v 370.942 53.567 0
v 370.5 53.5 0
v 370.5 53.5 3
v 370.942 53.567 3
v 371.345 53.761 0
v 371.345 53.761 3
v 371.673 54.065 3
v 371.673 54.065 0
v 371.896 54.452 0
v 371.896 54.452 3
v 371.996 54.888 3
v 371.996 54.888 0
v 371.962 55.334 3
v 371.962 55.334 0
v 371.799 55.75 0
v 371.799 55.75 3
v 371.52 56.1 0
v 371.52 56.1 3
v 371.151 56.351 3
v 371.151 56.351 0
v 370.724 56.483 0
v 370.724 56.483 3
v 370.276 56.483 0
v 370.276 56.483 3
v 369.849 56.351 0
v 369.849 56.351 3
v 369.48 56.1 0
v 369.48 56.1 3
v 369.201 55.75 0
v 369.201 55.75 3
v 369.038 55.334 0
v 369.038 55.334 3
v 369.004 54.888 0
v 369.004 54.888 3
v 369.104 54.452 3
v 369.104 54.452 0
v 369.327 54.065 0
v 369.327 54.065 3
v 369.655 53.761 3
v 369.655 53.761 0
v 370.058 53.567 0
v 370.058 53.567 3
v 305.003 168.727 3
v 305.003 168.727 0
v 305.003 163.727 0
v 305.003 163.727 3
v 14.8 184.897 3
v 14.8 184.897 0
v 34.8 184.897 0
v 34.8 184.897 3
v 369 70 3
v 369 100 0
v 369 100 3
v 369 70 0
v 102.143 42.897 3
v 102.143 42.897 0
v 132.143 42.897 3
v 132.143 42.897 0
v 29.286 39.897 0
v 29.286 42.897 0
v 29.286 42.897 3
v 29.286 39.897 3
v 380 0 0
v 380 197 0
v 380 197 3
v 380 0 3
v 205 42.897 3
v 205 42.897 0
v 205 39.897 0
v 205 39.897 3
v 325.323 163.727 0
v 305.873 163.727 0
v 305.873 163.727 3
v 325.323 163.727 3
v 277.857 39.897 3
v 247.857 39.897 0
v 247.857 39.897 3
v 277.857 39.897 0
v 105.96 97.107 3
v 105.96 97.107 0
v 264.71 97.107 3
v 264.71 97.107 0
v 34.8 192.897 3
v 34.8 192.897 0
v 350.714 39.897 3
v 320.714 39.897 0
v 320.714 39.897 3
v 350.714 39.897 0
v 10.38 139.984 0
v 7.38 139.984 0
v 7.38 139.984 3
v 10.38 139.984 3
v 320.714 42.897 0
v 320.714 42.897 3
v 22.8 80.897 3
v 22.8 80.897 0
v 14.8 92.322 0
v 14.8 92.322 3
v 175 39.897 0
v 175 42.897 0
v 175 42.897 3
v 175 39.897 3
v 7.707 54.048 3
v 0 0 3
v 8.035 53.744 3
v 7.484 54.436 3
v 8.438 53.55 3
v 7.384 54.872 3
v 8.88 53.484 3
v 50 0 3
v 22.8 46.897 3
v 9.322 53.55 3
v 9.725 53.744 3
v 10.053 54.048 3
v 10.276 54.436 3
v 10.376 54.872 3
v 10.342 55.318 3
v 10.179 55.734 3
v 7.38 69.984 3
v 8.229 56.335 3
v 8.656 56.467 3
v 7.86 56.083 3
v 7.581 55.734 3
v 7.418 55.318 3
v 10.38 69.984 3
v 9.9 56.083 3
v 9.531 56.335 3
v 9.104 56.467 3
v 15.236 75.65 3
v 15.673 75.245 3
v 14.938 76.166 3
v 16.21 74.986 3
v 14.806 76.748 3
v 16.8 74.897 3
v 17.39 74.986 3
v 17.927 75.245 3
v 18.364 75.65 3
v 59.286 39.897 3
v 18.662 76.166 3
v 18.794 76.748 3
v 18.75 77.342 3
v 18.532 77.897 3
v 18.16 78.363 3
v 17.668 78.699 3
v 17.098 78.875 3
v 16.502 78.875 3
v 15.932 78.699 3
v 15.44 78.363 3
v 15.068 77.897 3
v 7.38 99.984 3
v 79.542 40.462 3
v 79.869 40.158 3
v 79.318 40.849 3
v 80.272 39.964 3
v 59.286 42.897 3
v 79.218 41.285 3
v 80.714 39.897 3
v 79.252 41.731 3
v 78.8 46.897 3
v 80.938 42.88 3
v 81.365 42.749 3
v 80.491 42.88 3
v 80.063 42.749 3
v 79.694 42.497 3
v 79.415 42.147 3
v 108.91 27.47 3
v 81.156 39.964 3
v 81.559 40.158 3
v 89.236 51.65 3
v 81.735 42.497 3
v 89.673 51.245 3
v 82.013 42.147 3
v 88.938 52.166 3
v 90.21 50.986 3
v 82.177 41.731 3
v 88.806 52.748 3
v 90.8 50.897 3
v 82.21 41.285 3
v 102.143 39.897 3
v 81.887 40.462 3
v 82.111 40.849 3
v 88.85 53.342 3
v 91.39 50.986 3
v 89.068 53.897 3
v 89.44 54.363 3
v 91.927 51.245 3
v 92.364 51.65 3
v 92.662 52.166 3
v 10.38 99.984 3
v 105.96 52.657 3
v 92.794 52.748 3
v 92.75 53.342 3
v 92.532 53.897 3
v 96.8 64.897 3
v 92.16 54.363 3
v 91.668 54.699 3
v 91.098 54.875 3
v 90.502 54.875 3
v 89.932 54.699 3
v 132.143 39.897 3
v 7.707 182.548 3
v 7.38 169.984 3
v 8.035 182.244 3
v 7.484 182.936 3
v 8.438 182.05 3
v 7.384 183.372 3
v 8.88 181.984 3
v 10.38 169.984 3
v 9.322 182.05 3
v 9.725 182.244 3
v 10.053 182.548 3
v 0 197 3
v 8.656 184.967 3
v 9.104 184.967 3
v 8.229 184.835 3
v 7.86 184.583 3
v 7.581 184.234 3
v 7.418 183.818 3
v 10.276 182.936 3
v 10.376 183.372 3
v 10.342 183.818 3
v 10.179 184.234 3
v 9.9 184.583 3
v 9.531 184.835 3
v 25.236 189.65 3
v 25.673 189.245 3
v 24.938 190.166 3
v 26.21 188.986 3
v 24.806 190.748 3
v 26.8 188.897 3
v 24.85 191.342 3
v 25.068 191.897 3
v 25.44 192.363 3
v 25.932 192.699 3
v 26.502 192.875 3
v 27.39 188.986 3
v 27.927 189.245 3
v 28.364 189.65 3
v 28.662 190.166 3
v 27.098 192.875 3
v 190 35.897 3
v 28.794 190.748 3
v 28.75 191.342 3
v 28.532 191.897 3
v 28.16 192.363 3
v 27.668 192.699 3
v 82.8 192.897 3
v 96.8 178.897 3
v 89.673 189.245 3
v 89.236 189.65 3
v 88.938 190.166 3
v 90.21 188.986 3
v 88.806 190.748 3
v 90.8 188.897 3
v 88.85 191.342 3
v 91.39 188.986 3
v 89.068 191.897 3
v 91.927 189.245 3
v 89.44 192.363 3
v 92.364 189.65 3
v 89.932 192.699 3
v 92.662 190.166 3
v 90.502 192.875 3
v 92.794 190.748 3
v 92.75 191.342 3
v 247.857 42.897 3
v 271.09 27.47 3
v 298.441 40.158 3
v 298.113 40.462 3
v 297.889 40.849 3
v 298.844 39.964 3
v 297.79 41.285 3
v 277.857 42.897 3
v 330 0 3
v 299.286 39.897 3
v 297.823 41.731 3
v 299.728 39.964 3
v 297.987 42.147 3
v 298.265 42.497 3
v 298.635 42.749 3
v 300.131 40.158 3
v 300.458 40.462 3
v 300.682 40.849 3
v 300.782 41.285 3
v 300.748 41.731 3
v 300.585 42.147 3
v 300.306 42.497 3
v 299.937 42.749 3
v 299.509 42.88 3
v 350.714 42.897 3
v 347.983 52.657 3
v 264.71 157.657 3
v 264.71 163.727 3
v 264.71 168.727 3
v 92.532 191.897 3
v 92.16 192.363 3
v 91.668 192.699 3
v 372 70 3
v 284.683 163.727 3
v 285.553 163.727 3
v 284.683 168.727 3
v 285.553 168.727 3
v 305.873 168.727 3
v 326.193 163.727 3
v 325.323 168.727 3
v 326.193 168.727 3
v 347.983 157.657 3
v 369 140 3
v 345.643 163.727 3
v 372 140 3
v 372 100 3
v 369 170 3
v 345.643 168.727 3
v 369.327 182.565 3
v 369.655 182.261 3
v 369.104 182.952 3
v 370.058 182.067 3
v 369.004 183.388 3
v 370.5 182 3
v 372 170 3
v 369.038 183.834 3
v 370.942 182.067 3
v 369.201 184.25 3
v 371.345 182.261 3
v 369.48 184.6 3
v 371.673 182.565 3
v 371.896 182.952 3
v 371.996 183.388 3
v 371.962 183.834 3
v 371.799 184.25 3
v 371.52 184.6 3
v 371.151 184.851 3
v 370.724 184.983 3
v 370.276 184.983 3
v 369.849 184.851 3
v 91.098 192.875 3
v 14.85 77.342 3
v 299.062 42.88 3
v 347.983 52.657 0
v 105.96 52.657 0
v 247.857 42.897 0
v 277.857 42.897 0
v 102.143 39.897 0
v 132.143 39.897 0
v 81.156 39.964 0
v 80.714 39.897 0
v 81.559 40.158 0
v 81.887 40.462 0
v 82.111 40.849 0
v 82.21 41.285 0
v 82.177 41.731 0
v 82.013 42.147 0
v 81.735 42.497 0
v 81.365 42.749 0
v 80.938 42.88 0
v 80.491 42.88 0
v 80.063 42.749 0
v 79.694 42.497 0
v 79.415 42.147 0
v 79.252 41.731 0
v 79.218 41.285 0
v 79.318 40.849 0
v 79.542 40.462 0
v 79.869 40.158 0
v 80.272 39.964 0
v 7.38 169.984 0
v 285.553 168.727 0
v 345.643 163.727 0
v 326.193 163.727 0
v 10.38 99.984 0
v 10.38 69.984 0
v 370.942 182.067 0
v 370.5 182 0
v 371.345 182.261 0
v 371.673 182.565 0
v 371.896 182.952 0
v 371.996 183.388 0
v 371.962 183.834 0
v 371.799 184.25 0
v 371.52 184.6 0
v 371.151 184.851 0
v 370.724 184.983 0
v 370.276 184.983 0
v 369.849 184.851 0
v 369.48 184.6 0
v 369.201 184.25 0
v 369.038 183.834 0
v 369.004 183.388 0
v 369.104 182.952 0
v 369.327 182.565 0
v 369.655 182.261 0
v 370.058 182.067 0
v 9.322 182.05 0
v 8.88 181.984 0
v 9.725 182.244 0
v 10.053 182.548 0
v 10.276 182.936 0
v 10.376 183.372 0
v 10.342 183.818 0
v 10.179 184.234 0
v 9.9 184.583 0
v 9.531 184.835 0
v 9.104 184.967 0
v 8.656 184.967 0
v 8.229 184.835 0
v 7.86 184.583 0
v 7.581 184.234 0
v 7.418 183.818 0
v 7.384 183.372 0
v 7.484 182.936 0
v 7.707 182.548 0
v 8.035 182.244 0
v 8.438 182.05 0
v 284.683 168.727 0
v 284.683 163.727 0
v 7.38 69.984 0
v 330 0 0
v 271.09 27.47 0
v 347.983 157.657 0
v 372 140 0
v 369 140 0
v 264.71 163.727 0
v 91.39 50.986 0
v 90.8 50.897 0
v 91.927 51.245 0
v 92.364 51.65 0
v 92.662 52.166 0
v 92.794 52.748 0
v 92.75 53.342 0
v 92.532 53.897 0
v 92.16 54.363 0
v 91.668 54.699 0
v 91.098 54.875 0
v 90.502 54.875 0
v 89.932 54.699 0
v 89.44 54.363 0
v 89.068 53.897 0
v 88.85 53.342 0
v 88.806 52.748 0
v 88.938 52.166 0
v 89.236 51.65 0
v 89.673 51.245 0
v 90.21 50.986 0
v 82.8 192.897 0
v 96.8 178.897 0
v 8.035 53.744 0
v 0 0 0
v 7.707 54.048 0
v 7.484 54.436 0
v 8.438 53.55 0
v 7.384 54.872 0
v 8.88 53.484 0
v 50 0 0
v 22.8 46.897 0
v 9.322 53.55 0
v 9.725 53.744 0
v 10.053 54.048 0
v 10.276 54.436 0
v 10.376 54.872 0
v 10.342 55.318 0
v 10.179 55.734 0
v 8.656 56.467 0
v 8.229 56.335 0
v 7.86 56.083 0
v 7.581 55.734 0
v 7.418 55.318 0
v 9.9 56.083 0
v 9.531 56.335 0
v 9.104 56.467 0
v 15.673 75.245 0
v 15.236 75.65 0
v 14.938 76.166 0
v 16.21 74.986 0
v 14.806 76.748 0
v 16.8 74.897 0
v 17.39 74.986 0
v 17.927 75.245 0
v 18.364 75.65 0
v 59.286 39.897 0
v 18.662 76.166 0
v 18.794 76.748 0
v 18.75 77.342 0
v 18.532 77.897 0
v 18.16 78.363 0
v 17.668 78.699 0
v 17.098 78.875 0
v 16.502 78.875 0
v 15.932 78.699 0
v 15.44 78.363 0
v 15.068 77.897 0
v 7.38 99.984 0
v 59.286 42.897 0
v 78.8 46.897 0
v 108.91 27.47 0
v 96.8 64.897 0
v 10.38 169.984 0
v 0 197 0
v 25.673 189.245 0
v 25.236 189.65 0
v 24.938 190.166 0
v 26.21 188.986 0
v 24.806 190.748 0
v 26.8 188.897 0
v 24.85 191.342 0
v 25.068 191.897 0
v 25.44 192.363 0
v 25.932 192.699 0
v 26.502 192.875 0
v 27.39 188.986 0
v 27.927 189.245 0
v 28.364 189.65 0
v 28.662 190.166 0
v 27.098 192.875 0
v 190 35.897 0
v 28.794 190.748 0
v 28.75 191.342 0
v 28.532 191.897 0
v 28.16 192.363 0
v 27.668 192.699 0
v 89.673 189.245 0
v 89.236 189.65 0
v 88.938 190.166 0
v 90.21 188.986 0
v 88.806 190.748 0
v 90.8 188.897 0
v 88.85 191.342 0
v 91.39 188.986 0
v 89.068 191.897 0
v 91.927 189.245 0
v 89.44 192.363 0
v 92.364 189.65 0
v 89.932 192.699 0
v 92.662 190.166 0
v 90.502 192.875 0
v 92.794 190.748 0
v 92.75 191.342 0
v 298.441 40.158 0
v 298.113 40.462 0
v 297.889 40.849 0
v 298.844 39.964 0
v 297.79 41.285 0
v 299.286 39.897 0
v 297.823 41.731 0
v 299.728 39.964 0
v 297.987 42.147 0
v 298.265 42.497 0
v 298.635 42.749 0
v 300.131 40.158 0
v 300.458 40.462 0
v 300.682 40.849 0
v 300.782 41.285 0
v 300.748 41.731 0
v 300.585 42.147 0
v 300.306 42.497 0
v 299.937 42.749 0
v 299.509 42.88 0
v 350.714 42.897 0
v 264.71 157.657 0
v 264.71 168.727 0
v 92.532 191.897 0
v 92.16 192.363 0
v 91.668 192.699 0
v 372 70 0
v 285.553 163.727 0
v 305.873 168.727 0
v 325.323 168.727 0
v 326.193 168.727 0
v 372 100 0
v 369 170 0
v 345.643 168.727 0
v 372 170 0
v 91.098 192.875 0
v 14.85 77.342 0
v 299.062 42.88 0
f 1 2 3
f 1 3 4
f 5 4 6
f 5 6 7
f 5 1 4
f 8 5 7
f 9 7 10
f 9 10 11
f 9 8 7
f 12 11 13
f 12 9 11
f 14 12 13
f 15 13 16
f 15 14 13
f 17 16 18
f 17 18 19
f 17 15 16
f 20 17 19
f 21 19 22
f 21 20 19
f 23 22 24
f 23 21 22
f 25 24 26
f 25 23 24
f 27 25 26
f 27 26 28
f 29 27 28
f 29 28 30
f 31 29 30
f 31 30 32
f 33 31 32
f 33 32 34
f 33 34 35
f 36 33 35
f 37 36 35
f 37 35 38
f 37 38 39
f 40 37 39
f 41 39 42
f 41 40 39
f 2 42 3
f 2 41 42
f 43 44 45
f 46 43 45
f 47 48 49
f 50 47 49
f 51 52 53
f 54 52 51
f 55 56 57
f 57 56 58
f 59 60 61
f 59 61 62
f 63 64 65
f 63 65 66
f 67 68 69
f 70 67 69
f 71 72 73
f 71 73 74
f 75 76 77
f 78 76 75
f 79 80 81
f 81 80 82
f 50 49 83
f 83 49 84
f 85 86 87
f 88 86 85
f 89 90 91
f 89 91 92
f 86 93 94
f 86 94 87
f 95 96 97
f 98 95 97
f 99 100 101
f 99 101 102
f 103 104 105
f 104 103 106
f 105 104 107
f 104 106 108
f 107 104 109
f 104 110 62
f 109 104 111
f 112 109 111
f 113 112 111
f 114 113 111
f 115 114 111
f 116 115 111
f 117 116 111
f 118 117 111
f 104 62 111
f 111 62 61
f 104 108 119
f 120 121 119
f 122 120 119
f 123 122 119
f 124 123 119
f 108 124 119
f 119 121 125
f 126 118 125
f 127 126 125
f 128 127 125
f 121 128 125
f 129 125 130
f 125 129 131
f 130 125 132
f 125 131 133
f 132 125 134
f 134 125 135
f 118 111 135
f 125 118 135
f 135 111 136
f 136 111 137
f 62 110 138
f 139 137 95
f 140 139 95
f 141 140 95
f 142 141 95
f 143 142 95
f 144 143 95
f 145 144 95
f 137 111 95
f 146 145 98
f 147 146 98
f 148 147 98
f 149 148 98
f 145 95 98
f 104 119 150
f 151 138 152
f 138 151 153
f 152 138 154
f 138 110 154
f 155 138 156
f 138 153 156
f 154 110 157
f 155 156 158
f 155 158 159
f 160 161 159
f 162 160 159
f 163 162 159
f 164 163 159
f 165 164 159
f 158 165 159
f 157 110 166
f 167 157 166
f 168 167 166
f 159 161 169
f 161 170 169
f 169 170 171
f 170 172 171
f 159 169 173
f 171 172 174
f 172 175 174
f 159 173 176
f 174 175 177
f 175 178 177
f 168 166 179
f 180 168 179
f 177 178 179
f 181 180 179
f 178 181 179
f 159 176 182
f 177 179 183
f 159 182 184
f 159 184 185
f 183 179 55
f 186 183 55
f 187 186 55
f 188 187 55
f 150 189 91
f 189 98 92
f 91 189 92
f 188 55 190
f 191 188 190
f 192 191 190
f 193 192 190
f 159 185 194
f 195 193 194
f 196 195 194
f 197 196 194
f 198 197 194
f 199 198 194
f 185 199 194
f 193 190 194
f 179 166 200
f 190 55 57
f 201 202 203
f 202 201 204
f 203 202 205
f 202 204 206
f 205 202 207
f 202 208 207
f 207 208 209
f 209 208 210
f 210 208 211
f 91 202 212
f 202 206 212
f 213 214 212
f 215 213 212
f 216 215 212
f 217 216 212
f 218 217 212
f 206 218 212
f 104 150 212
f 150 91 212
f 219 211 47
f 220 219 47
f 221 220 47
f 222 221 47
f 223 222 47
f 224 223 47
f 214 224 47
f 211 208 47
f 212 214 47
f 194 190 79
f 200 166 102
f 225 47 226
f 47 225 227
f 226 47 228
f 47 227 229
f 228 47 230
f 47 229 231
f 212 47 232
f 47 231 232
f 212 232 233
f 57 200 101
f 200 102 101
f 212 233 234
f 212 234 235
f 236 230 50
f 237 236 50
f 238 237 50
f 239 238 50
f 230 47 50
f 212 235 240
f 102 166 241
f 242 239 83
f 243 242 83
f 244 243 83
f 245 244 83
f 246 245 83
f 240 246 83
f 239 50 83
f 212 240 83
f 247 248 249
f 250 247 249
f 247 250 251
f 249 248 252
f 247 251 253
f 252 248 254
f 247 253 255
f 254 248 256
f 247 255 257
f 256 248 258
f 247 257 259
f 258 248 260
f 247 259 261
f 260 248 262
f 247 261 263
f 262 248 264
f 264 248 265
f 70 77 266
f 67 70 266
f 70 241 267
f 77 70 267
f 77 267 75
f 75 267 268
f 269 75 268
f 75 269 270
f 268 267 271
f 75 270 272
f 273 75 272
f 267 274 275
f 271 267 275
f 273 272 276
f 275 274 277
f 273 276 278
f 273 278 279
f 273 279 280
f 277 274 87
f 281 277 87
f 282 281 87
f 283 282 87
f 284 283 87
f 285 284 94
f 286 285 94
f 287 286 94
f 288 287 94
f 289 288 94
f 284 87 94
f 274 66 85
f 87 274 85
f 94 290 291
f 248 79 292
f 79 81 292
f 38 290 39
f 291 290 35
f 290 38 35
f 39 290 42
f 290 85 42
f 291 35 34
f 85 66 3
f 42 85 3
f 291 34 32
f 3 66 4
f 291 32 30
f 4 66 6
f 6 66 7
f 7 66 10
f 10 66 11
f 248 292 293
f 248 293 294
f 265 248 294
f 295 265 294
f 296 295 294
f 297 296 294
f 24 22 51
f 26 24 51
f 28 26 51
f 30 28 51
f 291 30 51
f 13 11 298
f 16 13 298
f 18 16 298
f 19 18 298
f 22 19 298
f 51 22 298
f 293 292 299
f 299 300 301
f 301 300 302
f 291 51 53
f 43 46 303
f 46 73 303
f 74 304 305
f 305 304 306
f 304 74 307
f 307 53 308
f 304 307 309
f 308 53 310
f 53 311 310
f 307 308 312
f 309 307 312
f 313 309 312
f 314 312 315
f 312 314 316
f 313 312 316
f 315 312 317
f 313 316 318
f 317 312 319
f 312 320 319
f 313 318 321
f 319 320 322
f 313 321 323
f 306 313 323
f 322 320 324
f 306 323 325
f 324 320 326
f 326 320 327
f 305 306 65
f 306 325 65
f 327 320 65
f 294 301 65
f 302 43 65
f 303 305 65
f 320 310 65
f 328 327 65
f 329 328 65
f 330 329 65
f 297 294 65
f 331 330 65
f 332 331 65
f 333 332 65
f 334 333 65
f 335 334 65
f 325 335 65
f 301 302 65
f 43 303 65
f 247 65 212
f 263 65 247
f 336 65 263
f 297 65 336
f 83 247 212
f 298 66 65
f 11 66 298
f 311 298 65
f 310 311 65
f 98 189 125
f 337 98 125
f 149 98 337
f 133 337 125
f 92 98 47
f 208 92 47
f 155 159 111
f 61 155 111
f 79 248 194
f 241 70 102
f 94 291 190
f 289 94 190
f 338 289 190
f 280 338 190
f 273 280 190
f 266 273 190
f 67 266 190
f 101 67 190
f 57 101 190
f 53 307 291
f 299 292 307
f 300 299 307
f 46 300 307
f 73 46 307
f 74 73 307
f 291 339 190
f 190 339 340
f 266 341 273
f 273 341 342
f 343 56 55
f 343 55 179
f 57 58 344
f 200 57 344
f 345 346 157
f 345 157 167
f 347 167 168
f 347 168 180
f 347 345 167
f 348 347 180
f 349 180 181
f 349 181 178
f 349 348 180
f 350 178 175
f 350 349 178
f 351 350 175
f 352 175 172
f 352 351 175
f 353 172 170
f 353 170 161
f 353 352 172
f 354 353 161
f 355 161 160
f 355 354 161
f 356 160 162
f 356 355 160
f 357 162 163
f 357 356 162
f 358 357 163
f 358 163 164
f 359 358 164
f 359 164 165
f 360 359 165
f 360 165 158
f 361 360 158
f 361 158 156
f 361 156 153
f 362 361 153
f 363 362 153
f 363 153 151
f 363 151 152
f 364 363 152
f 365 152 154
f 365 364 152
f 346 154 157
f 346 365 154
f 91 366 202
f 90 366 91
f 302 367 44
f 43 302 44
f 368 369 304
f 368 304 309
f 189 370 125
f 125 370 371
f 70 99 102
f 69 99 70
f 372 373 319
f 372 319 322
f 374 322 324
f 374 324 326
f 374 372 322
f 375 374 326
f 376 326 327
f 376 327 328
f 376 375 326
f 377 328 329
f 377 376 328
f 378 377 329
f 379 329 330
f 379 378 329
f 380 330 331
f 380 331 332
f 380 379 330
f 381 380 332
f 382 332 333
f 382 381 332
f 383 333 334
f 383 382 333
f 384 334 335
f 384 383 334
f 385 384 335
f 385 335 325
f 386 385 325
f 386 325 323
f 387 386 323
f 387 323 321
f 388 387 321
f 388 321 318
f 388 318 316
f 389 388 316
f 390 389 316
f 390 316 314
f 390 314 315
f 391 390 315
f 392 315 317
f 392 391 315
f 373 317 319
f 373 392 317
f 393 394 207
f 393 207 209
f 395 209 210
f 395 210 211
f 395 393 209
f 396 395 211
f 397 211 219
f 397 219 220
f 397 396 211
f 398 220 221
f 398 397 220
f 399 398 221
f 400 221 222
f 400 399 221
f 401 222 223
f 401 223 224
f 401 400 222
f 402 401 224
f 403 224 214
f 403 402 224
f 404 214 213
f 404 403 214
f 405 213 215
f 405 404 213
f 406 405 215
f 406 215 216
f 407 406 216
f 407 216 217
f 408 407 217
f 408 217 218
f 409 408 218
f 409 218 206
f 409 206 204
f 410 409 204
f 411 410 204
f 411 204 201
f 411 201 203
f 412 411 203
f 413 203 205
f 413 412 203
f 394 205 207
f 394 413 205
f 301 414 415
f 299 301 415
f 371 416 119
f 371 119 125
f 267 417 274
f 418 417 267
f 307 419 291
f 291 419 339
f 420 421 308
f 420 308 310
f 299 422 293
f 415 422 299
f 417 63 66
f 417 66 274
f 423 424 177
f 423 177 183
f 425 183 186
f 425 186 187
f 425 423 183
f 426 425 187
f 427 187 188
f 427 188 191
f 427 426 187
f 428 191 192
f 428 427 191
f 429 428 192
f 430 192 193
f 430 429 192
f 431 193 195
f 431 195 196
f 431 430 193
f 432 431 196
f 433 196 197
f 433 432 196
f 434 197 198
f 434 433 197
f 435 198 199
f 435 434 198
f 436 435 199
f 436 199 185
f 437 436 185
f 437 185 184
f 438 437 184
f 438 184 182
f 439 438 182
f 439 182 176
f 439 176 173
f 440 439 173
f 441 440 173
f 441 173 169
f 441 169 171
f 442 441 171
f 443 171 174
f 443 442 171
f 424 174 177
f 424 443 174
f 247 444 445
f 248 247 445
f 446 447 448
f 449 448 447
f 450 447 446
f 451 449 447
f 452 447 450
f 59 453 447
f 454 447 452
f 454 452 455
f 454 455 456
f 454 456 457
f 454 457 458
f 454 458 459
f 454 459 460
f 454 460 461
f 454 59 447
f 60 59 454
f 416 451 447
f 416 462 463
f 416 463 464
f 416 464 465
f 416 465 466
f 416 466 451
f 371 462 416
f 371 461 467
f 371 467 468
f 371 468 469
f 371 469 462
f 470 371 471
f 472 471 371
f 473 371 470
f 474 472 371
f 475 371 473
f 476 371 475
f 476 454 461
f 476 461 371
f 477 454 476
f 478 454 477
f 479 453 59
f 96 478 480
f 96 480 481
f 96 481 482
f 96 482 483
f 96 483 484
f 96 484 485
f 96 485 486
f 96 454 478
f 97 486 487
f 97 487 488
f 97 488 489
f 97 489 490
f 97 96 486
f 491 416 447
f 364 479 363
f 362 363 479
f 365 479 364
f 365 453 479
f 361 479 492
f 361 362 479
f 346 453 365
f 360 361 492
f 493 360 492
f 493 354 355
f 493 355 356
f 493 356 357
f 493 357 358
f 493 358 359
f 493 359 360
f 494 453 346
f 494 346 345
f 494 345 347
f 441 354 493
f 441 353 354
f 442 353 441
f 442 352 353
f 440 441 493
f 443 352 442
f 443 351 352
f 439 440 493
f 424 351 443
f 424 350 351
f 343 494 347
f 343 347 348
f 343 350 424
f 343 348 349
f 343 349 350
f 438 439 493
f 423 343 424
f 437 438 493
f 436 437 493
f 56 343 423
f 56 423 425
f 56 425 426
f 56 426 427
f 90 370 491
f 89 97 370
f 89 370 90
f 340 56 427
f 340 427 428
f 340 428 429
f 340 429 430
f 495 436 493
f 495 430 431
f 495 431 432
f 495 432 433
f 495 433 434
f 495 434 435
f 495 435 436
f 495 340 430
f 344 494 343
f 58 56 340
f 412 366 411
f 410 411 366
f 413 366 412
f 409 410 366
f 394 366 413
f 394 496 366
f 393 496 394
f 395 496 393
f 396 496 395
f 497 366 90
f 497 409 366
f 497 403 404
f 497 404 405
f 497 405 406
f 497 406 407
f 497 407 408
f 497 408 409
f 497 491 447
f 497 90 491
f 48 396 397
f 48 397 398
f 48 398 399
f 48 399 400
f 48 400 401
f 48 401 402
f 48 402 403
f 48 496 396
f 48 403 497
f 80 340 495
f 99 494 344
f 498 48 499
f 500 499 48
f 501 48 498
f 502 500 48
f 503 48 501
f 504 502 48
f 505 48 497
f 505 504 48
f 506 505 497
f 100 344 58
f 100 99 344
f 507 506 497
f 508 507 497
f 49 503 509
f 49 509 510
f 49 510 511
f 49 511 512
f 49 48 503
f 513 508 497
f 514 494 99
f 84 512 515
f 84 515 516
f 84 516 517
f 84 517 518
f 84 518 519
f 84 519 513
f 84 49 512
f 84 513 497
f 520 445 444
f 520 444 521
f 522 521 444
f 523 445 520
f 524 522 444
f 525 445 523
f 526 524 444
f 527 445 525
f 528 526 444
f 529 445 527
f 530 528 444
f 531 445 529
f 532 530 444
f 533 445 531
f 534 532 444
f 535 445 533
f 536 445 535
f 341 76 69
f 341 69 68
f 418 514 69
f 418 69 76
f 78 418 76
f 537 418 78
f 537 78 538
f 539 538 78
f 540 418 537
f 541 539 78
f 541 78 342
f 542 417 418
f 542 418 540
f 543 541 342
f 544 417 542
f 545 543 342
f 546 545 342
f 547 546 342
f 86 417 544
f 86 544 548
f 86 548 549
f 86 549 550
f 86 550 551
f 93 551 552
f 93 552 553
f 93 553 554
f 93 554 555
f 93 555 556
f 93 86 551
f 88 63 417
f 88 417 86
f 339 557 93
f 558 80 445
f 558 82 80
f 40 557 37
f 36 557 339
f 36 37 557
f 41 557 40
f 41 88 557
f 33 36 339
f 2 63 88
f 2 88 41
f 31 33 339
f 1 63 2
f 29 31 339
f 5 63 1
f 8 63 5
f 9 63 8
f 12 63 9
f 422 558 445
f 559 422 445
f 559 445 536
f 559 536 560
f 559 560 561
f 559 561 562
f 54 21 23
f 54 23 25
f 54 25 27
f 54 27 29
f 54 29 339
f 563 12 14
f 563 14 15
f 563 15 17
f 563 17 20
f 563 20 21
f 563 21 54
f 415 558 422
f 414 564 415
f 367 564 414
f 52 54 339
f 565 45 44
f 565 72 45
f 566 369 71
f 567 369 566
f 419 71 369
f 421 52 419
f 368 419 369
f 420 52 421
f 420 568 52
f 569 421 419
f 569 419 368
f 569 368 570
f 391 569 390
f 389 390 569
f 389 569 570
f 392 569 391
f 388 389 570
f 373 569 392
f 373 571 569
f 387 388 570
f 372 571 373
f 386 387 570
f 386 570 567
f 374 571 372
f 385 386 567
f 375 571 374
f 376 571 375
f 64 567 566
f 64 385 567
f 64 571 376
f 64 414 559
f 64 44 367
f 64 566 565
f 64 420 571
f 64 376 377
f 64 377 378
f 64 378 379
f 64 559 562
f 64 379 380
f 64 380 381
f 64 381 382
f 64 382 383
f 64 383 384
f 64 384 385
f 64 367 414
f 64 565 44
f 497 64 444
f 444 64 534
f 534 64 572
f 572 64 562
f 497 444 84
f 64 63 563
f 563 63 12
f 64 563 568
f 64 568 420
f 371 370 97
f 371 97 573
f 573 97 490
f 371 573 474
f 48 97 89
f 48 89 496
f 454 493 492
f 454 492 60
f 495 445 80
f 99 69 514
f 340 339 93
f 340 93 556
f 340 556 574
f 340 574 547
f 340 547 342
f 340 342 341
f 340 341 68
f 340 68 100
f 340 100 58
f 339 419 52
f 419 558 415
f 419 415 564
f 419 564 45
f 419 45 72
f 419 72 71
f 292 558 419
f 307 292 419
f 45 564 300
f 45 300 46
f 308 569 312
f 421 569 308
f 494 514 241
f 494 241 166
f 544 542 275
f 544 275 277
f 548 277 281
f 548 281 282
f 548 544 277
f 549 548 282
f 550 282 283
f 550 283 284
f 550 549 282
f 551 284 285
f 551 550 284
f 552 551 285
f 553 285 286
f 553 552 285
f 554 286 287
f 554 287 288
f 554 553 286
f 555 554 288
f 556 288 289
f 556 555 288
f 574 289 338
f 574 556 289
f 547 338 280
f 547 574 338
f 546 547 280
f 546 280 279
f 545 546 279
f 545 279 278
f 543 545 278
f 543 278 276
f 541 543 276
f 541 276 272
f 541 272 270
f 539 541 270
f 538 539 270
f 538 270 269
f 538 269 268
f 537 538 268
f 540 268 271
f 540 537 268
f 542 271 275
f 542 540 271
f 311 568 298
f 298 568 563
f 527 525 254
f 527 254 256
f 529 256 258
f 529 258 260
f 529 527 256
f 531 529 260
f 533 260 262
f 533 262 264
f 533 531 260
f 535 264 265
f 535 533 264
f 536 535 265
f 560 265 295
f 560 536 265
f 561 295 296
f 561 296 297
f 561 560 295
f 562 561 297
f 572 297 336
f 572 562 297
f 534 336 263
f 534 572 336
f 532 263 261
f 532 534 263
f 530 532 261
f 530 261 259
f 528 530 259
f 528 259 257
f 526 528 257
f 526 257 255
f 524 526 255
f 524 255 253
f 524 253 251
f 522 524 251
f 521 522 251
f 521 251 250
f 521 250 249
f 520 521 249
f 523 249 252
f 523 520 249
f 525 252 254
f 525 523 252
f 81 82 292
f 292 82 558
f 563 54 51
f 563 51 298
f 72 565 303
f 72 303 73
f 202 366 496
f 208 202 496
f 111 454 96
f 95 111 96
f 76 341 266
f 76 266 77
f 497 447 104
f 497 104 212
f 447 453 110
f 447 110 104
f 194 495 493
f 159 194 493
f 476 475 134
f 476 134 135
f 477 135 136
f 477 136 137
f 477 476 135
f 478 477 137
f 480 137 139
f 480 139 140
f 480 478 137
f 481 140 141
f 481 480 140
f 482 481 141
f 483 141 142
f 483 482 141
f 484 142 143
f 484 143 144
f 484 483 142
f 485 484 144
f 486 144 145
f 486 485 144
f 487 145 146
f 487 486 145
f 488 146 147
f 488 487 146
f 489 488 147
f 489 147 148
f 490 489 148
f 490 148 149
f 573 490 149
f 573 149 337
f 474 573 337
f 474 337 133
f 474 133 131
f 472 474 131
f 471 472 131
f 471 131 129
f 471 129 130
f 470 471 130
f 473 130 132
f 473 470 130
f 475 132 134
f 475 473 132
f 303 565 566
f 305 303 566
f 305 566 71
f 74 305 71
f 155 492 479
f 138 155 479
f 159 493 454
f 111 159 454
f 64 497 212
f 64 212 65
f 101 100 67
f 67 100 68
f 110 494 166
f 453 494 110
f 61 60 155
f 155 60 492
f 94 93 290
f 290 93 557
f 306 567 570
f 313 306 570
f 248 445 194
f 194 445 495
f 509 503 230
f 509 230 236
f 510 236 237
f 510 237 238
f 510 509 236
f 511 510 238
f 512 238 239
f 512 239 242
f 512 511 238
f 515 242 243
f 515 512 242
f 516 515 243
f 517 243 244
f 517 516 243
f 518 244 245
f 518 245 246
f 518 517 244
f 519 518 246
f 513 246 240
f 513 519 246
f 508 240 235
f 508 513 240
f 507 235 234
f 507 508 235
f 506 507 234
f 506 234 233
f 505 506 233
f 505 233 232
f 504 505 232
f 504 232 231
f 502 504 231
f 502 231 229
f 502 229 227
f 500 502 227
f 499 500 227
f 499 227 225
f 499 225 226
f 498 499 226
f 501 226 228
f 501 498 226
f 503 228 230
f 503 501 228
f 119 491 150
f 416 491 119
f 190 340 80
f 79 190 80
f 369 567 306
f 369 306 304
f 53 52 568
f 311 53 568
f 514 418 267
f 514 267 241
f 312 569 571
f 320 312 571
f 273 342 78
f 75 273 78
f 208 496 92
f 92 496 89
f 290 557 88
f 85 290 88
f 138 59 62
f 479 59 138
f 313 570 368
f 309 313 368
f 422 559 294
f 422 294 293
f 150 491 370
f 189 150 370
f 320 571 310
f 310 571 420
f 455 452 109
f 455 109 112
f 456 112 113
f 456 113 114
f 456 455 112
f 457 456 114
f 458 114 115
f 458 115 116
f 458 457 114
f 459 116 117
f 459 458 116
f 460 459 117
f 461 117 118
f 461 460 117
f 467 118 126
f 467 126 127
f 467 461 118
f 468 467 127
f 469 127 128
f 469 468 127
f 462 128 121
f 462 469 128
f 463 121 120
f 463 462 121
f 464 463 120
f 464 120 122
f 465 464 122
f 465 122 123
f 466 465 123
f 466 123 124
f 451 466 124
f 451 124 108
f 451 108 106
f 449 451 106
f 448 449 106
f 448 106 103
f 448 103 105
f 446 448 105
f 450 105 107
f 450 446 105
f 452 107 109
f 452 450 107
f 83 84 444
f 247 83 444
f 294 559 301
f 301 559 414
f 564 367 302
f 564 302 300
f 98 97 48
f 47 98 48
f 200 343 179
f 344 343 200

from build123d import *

# Parameters (mm, degrees)
SKETCH1_R           = 2
SKETCH1_R_2         = 1.5
SKETCH1_W           = 30
SKETCH1_H           = 3
SKETCH1_W_2         = 3
SKETCH1_H_2         = 30
SKETCH1_W_3         = 5
SKETCH1_H_3         = 19.9734
SKETCH1_H_4         = 19.45
BOSS_EXTRUDE1_DEPTH = 3


with BuildPart() as part:
    # Sketch1 → Boss-Extrude1 (new body)
    with BuildSketch(Plane(origin=(-12.611770594, -16.696126479, 0), x_dir=(0, -1, 0), z_dir=(0, 0, 1))):
        Polygon((-213.696126479, 12.611770594), (-213.696126479, 392.611770594), (-16.696126479, 392.611770594), (-16.696126479, 342.611770594), (-44.166313492, 283.701764437), (-52.593278212, 202.611770594), (-44.166313492, 121.521776752), (-16.696126479, 62.611770594), (-16.696126479, 12.611770594), align=None)
        with Locations((-207.593278212, 103.411770594)):
            Circle(SKETCH1_R, mode=Mode.SUBTRACT)
        with Locations((-69.593278212, 103.411770594)):
            Circle(SKETCH1_R, mode=Mode.SUBTRACT)
        with Locations((-93.593278212, 29.411770594)):
            Circle(SKETCH1_R, mode=Mode.SUBTRACT)
        with Locations((-207.593278212, 39.411770594)):
            Circle(SKETCH1_R, mode=Mode.SUBTRACT)
        with Locations((-200.179850585, 21.491770594)):
            Circle(SKETCH1_R_2, mode=Mode.SUBTRACT)
        with Locations((-58.093278212, 311.89748488)):
            Circle(SKETCH1_R_2, mode=Mode.SUBTRACT)
        with Locations((-200.196126479, 383.111770594)):
            Circle(SKETCH1_R_2, mode=Mode.SUBTRACT)
        with Locations((-71.696126479, 383.111770594)):
            Circle(SKETCH1_R_2, mode=Mode.SUBTRACT)
        with Locations((-58.093278212, 93.326056309)):
            Circle(SKETCH1_R_2, mode=Mode.SUBTRACT)
        with Locations((-71.679850585, 21.491770594)):
            Circle(SKETCH1_R_2, mode=Mode.SUBTRACT)
        Polygon((-209.593278212, 95.411770594), (-195.593278212, 109.411770594), (-81.593278212, 109.411770594), (-63.593278212, 91.411770594), (-63.593278212, 35.411770594), (-97.593278212, 35.411770594), (-109.018462266, 27.411770594), (-201.593276784, 27.411770594), (-201.593276784, 47.411770594), (-209.593278212, 47.411770594), align=None, mode=Mode.SUBTRACT)
        with Locations((-171.679850585, 21.491770594)):
            Rectangle(SKETCH1_W, SKETCH1_H, mode=Mode.SUBTRACT)
        with Locations((-101.679850585, 21.491770594)):
            Rectangle(SKETCH1_W, SKETCH1_H, mode=Mode.SUBTRACT)
        with Locations((-58.093278212, 56.89748488)):
            Rectangle(SKETCH1_W_2, SKETCH1_H_2, mode=Mode.SUBTRACT)
        with Locations((-58.093278212, 129.754627737)):
            Rectangle(SKETCH1_W_2, SKETCH1_H_2, mode=Mode.SUBTRACT)
        with Locations((-58.093278212, 202.611770594)):
            Rectangle(SKETCH1_W_2, SKETCH1_H_2, mode=Mode.SUBTRACT)
        with Locations((-58.093278212, 275.468913452)):
            Rectangle(SKETCH1_W_2, SKETCH1_H_2, mode=Mode.SUBTRACT)
        with Locations((-58.093278212, 348.326056309)):
            Rectangle(SKETCH1_W_2, SKETCH1_H_2, mode=Mode.SUBTRACT)
        with Locations((-101.696126479, 383.111770594)):
            Rectangle(SKETCH1_W, SKETCH1_H, mode=Mode.SUBTRACT)
        with Locations((-171.696126479, 383.111770594)):
            Rectangle(SKETCH1_W, SKETCH1_H, mode=Mode.SUBTRACT)
        Polygon((-69.353278212, 118.571770594), (-113.803278212, 118.571770594), (-113.803278212, 277.321770594), (-174.353278212, 277.321770594), (-174.353278212, 360.595170594), (-69.353278212, 360.595170594), align=None, mode=Mode.SUBTRACT)
        with Locations((-182.923278212, 287.308470594)):
            Rectangle(SKETCH1_W_3, SKETCH1_H_3, mode=Mode.SUBTRACT)
        with Locations((-182.923278212, 307.890170594)):
            Rectangle(SKETCH1_W_3, SKETCH1_H_4, mode=Mode.SUBTRACT)
        with Locations((-182.923278212, 328.210170594)):
            Rectangle(SKETCH1_W_3, SKETCH1_H_4, mode=Mode.SUBTRACT)
        with Locations((-182.923278212, 348.530170594)):
            Rectangle(SKETCH1_W_3, SKETCH1_H_4, mode=Mode.SUBTRACT)
    extrude(amount=BOSS_EXTRUDE1_DEPTH)


solid = part.part
